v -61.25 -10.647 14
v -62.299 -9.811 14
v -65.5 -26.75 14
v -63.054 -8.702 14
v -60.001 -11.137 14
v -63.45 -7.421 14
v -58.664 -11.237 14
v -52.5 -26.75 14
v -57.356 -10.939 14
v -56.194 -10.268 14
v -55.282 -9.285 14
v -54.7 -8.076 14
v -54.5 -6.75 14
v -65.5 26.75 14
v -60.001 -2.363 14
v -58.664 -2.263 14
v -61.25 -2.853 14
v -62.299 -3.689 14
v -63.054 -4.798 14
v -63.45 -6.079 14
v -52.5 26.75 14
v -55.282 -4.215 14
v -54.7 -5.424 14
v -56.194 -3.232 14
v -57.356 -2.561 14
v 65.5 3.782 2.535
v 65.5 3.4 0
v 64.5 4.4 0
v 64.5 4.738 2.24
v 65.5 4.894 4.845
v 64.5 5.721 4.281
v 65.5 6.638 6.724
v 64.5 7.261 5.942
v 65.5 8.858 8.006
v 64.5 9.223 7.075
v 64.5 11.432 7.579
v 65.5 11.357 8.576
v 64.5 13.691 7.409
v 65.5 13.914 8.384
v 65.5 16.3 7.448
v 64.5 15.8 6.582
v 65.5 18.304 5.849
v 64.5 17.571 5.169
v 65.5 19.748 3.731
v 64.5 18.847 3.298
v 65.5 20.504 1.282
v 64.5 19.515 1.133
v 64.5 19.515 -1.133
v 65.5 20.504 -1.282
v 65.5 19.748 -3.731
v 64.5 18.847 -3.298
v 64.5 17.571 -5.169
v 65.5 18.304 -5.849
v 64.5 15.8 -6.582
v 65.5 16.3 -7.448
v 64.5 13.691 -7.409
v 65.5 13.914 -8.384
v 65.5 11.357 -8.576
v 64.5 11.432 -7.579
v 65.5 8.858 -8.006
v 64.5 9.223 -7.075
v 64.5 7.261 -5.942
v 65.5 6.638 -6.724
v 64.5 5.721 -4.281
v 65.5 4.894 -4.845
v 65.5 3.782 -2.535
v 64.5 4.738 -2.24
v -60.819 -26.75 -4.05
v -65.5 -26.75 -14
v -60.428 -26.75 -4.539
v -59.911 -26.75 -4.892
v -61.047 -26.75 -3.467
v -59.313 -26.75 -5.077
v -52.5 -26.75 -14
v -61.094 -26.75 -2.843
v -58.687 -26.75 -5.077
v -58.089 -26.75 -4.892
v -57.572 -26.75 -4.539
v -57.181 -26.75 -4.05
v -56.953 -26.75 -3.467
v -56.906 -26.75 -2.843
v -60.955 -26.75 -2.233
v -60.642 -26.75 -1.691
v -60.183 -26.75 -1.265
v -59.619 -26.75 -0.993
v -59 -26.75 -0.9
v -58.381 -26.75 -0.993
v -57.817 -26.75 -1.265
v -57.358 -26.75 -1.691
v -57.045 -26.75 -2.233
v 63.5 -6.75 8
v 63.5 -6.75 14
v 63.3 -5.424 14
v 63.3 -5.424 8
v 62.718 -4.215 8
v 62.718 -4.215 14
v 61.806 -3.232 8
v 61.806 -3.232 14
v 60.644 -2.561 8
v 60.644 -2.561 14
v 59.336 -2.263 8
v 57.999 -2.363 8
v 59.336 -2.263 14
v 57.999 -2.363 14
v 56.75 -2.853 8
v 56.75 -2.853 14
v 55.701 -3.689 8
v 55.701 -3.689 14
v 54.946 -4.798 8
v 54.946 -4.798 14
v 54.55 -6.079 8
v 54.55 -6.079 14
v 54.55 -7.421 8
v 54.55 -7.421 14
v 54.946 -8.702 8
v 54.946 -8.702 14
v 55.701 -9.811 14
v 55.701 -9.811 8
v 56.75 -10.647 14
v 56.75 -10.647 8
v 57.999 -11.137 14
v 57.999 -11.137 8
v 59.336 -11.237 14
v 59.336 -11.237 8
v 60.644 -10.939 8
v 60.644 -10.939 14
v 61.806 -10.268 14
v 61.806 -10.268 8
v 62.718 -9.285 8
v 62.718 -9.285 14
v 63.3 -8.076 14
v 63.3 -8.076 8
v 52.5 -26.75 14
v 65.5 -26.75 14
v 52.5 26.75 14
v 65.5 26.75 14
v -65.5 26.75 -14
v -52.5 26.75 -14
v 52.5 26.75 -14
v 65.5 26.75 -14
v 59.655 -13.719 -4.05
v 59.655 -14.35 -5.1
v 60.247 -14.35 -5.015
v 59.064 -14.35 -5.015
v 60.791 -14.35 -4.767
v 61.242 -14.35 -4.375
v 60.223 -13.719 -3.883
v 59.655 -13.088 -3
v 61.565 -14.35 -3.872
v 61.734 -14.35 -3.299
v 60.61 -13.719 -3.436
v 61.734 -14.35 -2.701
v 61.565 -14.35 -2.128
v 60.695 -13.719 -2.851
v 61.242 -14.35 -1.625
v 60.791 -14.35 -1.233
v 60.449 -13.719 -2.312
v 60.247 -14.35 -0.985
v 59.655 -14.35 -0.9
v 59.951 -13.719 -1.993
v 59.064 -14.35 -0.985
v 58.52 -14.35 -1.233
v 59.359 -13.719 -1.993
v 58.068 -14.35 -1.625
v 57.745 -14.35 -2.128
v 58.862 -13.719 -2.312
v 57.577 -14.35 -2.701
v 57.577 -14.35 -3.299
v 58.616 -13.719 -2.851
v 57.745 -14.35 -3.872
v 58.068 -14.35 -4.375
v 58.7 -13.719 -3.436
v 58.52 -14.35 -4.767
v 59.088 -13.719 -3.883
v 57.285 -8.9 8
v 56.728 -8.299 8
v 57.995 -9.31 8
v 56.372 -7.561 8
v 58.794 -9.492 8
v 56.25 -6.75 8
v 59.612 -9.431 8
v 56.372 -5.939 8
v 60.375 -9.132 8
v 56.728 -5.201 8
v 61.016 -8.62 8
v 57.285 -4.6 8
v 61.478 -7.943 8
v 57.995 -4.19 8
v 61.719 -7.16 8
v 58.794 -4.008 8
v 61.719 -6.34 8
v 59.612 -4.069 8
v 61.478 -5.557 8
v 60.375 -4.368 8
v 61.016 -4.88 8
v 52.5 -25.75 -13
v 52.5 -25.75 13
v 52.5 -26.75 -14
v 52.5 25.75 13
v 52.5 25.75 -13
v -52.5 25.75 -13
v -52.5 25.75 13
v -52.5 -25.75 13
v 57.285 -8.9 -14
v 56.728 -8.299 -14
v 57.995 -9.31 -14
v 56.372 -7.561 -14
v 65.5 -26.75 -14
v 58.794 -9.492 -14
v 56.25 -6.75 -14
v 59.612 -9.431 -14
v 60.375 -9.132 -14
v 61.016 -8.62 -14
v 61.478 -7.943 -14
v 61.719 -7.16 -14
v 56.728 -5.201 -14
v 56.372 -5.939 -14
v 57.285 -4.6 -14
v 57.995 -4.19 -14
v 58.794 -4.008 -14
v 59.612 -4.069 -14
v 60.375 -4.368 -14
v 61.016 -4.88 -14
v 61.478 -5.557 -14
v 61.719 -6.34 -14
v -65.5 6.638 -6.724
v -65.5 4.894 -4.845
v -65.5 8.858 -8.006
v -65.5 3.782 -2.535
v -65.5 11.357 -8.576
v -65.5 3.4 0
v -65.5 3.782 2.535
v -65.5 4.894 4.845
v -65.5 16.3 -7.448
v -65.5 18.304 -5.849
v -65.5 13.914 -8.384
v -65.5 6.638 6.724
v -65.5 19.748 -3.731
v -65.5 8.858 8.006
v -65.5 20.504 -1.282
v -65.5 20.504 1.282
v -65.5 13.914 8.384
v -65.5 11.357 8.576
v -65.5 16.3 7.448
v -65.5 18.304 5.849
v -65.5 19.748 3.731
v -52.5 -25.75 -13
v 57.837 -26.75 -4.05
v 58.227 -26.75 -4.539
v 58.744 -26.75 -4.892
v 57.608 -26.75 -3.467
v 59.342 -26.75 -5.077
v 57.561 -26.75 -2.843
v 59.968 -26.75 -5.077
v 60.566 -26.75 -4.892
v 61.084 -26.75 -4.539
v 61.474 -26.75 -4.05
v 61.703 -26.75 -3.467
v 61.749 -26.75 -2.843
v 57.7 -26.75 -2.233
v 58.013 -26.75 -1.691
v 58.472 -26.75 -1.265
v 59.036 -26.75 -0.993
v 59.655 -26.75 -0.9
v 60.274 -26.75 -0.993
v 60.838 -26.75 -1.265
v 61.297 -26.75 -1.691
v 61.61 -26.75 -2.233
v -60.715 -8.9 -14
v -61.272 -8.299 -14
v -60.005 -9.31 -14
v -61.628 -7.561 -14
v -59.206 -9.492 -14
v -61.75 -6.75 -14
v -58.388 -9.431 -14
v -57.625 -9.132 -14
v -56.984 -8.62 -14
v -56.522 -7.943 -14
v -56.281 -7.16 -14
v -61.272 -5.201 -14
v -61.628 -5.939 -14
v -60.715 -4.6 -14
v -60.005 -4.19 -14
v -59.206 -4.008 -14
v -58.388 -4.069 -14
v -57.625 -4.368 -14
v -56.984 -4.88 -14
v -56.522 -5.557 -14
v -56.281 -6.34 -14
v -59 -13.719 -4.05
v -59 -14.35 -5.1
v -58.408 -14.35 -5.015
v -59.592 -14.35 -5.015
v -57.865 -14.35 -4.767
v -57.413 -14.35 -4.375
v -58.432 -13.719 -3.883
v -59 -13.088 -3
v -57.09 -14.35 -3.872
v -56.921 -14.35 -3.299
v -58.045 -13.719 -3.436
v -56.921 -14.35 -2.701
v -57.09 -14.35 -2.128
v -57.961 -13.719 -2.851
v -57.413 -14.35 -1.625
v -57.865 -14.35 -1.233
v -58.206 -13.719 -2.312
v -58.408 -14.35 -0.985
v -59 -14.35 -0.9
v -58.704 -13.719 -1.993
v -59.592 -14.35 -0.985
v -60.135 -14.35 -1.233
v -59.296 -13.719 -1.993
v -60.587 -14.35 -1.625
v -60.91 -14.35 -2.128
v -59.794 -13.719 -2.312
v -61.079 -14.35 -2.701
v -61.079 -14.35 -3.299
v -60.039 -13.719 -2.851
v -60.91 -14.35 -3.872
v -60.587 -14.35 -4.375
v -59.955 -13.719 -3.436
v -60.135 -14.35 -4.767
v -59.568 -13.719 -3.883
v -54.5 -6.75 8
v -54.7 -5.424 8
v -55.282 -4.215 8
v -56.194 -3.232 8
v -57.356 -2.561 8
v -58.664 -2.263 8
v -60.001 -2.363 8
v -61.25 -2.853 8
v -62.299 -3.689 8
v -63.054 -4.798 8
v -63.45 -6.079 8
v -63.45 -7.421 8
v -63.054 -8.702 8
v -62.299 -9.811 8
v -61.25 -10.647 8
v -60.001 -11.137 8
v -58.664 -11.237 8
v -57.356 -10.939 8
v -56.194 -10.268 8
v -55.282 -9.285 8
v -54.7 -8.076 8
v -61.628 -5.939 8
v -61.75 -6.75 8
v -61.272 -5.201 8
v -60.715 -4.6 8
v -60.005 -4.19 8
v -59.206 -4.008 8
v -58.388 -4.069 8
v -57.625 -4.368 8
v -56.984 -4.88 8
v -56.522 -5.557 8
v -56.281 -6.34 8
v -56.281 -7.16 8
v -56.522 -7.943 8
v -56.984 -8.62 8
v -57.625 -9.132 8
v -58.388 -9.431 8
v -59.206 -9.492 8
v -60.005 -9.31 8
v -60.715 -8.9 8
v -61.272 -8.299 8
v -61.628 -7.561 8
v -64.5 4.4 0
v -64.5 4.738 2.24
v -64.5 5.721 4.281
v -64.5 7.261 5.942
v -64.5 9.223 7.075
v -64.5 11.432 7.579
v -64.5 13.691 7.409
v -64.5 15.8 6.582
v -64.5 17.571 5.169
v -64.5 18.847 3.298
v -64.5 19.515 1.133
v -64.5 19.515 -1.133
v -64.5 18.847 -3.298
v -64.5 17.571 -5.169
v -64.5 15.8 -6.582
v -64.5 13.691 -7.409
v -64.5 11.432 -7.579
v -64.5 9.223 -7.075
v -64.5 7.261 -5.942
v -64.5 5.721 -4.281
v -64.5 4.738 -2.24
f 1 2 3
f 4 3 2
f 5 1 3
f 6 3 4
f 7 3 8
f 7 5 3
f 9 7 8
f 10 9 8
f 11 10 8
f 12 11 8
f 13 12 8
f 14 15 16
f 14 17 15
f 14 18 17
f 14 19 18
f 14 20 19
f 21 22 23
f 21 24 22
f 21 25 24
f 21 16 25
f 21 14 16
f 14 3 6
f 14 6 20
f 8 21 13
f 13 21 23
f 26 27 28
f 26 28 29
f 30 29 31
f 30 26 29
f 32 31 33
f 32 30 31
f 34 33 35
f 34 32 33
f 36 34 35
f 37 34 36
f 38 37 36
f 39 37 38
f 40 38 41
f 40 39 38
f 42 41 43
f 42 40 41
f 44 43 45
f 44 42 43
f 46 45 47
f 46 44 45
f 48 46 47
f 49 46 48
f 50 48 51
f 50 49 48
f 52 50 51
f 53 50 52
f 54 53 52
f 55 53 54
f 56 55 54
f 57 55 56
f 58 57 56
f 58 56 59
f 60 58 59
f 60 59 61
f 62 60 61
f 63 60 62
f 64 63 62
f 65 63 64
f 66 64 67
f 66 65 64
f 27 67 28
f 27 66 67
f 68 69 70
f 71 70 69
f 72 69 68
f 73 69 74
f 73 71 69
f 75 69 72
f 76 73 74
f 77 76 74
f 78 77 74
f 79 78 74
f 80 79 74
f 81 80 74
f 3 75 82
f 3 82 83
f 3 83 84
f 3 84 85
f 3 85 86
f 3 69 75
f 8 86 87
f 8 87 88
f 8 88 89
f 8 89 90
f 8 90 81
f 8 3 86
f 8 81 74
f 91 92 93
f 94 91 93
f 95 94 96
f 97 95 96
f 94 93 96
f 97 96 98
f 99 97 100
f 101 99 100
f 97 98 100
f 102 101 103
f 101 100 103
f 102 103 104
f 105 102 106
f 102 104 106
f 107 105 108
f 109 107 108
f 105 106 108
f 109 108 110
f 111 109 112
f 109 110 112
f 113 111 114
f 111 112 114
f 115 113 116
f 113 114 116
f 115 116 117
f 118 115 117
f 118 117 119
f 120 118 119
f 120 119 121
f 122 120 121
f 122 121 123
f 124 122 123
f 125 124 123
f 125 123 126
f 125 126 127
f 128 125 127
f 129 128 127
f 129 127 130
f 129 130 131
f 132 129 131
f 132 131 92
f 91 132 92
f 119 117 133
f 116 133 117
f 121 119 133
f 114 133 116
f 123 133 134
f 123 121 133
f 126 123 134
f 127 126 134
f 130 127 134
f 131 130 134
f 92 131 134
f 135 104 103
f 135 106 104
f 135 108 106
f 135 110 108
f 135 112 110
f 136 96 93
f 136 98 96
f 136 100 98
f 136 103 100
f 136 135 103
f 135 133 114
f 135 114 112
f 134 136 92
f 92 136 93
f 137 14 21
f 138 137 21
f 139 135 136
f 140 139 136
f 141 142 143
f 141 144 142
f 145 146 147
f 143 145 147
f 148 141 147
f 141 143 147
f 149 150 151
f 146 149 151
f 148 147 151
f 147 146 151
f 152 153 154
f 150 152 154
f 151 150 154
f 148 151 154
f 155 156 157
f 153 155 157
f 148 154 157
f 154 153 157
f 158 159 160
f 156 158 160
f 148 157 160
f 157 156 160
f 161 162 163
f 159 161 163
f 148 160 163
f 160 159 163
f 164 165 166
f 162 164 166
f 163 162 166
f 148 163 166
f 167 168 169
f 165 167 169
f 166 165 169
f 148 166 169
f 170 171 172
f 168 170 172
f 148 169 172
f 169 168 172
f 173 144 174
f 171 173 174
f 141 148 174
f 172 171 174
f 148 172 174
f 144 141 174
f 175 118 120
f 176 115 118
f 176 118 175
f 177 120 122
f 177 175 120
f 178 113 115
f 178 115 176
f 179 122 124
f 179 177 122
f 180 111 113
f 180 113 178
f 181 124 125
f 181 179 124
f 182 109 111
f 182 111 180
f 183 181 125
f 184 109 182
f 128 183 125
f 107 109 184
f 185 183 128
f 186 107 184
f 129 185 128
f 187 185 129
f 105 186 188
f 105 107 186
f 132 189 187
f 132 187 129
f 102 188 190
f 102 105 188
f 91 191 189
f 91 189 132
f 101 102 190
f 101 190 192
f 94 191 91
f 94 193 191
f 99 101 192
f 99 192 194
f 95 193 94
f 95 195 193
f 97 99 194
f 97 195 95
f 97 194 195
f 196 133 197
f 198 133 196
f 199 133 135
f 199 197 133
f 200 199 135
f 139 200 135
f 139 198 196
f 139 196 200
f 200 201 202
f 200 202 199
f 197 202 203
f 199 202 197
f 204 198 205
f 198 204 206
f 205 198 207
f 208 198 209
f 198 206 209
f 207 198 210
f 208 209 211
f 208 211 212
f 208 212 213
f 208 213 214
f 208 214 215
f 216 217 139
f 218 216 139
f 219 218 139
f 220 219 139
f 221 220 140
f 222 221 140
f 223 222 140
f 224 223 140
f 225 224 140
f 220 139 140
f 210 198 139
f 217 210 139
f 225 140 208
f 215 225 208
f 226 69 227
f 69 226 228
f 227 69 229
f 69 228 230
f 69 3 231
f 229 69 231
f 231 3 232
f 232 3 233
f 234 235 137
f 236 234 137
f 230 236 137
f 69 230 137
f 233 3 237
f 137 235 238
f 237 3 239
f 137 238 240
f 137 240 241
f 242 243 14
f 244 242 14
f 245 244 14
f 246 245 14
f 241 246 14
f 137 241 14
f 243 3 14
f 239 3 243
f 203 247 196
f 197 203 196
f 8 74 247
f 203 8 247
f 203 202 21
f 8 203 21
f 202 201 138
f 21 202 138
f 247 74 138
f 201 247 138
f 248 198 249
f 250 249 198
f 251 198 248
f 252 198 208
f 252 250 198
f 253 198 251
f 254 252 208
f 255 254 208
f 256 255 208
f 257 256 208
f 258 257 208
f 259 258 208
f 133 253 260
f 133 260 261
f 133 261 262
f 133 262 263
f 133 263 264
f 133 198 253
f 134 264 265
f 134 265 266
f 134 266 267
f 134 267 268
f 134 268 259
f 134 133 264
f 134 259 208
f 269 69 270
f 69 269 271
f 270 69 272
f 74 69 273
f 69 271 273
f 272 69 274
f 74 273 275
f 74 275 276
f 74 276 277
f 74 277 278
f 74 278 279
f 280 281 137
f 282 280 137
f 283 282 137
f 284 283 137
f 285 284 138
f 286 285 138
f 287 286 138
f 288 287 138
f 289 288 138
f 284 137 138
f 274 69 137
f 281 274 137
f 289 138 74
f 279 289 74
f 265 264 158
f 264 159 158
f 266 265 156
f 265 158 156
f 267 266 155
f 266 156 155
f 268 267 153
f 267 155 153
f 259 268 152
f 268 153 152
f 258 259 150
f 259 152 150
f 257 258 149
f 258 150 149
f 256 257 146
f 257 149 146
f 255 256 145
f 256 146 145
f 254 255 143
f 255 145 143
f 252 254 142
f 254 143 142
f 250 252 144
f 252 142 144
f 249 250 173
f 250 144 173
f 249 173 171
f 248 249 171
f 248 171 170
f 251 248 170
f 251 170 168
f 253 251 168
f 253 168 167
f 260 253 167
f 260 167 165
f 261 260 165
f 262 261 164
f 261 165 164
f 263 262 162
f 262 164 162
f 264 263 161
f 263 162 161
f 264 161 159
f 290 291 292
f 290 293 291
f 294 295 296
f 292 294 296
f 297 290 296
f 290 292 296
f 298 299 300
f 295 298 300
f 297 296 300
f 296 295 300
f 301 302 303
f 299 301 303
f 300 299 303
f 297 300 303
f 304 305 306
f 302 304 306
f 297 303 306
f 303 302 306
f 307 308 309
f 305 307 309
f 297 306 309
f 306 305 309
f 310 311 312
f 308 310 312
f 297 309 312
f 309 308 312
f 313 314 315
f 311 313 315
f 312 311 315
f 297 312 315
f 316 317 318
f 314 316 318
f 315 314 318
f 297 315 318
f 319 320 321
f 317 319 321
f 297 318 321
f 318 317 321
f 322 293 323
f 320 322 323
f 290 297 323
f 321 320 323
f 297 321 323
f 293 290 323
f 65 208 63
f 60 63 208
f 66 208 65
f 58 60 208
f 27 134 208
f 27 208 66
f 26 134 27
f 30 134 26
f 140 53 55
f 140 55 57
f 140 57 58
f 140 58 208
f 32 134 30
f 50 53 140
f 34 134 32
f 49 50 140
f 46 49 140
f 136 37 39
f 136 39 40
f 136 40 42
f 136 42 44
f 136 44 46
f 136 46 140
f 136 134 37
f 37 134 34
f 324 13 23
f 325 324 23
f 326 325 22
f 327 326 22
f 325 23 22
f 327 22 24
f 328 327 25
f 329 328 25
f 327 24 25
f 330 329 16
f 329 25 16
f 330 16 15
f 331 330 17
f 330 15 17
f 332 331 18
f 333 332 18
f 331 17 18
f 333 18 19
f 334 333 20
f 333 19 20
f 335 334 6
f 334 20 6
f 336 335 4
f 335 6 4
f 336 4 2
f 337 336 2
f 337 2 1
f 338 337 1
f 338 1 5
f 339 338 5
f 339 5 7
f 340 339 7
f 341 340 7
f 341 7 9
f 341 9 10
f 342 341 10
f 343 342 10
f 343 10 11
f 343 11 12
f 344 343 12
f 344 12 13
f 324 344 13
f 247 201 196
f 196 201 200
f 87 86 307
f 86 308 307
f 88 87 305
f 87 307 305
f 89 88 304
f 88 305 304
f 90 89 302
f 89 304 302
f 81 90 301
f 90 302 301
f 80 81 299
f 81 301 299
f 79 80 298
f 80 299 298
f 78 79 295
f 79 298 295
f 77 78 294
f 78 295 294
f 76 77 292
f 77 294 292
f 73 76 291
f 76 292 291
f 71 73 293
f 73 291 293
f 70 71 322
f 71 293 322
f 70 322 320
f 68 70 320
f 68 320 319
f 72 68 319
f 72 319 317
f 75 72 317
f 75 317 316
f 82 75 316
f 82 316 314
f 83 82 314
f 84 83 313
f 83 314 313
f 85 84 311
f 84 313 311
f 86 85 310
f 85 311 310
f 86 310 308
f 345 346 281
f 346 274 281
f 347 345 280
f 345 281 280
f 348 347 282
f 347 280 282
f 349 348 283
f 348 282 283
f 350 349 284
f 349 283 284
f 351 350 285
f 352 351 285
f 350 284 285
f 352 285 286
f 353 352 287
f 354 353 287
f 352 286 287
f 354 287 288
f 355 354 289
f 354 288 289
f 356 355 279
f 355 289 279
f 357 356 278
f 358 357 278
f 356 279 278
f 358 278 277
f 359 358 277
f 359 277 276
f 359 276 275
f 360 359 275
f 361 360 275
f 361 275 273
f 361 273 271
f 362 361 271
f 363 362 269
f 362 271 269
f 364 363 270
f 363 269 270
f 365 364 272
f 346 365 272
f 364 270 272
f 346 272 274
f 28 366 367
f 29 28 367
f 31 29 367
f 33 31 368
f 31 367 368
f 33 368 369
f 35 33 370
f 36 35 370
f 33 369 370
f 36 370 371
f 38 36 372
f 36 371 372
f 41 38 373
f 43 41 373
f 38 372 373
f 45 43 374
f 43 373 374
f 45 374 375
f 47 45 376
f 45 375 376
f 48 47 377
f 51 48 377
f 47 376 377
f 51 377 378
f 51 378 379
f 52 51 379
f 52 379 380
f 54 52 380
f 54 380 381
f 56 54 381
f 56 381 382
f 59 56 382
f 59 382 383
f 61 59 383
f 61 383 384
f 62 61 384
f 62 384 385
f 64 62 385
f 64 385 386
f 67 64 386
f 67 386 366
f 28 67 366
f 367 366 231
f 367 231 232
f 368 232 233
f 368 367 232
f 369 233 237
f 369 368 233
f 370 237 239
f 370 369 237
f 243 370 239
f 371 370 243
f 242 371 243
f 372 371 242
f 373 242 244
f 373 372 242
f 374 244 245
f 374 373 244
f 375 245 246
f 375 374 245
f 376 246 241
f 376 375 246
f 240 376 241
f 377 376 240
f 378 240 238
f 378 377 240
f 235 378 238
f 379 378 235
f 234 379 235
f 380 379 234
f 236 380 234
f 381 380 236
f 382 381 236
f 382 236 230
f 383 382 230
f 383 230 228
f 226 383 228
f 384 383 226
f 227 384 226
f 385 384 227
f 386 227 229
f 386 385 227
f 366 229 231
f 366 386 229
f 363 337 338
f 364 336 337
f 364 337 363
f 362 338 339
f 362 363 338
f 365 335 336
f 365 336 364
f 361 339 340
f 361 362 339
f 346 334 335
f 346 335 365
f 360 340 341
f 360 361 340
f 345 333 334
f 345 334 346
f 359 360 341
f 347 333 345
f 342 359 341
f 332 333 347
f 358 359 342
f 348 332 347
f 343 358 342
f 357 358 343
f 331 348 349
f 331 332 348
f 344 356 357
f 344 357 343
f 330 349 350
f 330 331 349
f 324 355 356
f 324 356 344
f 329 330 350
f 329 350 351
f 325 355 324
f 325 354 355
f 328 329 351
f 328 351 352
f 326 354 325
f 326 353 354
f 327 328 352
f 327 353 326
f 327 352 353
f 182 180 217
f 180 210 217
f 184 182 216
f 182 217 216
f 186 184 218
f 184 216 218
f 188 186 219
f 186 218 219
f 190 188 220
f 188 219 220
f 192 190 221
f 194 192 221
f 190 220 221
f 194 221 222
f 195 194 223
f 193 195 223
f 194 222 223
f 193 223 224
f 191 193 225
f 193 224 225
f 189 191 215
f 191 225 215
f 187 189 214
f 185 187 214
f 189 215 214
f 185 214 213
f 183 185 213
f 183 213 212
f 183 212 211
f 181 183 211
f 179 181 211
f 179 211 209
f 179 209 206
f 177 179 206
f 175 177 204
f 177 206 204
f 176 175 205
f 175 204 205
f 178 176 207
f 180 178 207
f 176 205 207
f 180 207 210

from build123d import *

# Parameters (mm, degrees)
SKETCH1_W                               = 131
SKETCH1_H                               = 53.5
EXTRUDE1_DEPTH                          = 14
CUT_SWEEP1_START                        = -14
CUT_SWEEP1_OUTLINE_W                    = 105
CUT_SWEEP1_OUTLINE_H                    = 1
CUT_SWEEP1_DEPTH                        = 28
CUT_SWEEP1_2_OUTLINE_W                  = 105
CUT_SWEEP1_2_OUTLINE_H                  = 51.5
CUT_SWEEP1_2_DEPTH                      = 1
CUT_SWEEP1_START_2                      = 13
CUT_SWEEP1_3_OUTLINE_W                  = 105
CUT_SWEEP1_3_OUTLINE_H                  = 51.5
CUT_SWEEP1_3_DEPTH                      = 1
SKETCH3_R                               = 7.6
CUT_EXTRUDE1_DEPTH                      = 135.434231132
CBORE_FOR_M5_HEX_HEAD_BOLT1_D           = 5.5
CBORE_FOR_M5_HEX_HEAD_BOLT1_CBORE_D     = 9
CBORE_FOR_M5_HEX_HEAD_BOLT1_CBORE_DEPTH = 6
CHAMFER1_SIZE                           = 1
M5X0_8_TAPPED_HOLE1_D                   = 4.2
M5X0_8_TAPPED_HOLE1_DEPTH               = 12.4
M5X0_8_TAPPED_HOLE1_TIP                 = 1.2618073


# Read off the part's stored shape, not the designer's step: Cut-Sweep1
with BuildPart() as part:
    # Sketch1 → Extrude1 (new, symmetric)
    with BuildSketch(Plane.XY):
        Rectangle(SKETCH1_W, SKETCH1_H)
    extrude(amount=EXTRUDE1_DEPTH, both=True)

    # Cut-Sweep1 outline → Cut-Sweep1 (cut)
    with BuildSketch(Plane.XY.offset(CUT_SWEEP1_START)):
        with Locations((0, -26.25)):
            Rectangle(CUT_SWEEP1_OUTLINE_W, CUT_SWEEP1_OUTLINE_H)
        with Locations((0, 26.25)):
            Rectangle(CUT_SWEEP1_OUTLINE_W, CUT_SWEEP1_OUTLINE_H)
    extrude(amount=CUT_SWEEP1_DEPTH, mode=Mode.SUBTRACT)

    # Cut-Sweep1 2 outline → Cut-Sweep1 2 (cut)
    with BuildSketch(Plane.XY.offset(CUT_SWEEP1_START)):
        Rectangle(CUT_SWEEP1_2_OUTLINE_W, CUT_SWEEP1_2_OUTLINE_H)
    extrude(amount=CUT_SWEEP1_2_DEPTH, mode=Mode.SUBTRACT)

    # Cut-Sweep1 3 outline → Cut-Sweep1 3 (cut)
    with BuildSketch(Plane.XY.offset(CUT_SWEEP1_START_2)):
        Rectangle(CUT_SWEEP1_3_OUTLINE_W, CUT_SWEEP1_3_OUTLINE_H)
    extrude(amount=CUT_SWEEP1_3_DEPTH, mode=Mode.SUBTRACT)

    # Sketch3 → Cut-Extrude1 (cut, through all)
    with BuildSketch(Plane.ZY.offset(65.5)):
        with Locations(Location((0, 12, 0), (0, 0, 270))):
            Circle(SKETCH3_R)
    extrude(amount=-CUT_EXTRUDE1_DEPTH, mode=Mode.SUBTRACT)

    # CBORE for M5 Hex Head Bolt1 (through all)
    with Locations(Plane(origin=(-59, -6.75, 14), x_dir=(1, 0, 0), z_dir=(0, 0, 1))):
        with Locations((0, 0), (118, 0)):
            CounterBoreHole(CBORE_FOR_M5_HEX_HEAD_BOLT1_D / 2, CBORE_FOR_M5_HEX_HEAD_BOLT1_CBORE_D / 2, CBORE_FOR_M5_HEX_HEAD_BOLT1_CBORE_DEPTH)

    # Chamfer1
    chamfer1_edges = [part.edges().sort_by_distance(p)[0] for p in [
        (65.5, 19.6, 0),
        (-65.5, 19.6, 0),
    ]]
    chamfer(chamfer1_edges, length=CHAMFER1_SIZE)

    # M5x0.8 Tapped Hole1
    with Locations(Plane(origin=(-59, -26.75, -3), x_dir=(0, 0, -1), z_dir=(0, -1, 0))):
        with Locations((0, 0), (0, 118.655251347)):
            Hole(M5X0_8_TAPPED_HOLE1_D / 2, depth=M5X0_8_TAPPED_HOLE1_DEPTH)
            with Locations((0, 0, -(M5X0_8_TAPPED_HOLE1_DEPTH + M5X0_8_TAPPED_HOLE1_TIP / 2))):  # 118° drill point
                Cone(0, M5X0_8_TAPPED_HOLE1_D / 2, M5X0_8_TAPPED_HOLE1_TIP, mode=Mode.SUBTRACT)


solid = part.part
